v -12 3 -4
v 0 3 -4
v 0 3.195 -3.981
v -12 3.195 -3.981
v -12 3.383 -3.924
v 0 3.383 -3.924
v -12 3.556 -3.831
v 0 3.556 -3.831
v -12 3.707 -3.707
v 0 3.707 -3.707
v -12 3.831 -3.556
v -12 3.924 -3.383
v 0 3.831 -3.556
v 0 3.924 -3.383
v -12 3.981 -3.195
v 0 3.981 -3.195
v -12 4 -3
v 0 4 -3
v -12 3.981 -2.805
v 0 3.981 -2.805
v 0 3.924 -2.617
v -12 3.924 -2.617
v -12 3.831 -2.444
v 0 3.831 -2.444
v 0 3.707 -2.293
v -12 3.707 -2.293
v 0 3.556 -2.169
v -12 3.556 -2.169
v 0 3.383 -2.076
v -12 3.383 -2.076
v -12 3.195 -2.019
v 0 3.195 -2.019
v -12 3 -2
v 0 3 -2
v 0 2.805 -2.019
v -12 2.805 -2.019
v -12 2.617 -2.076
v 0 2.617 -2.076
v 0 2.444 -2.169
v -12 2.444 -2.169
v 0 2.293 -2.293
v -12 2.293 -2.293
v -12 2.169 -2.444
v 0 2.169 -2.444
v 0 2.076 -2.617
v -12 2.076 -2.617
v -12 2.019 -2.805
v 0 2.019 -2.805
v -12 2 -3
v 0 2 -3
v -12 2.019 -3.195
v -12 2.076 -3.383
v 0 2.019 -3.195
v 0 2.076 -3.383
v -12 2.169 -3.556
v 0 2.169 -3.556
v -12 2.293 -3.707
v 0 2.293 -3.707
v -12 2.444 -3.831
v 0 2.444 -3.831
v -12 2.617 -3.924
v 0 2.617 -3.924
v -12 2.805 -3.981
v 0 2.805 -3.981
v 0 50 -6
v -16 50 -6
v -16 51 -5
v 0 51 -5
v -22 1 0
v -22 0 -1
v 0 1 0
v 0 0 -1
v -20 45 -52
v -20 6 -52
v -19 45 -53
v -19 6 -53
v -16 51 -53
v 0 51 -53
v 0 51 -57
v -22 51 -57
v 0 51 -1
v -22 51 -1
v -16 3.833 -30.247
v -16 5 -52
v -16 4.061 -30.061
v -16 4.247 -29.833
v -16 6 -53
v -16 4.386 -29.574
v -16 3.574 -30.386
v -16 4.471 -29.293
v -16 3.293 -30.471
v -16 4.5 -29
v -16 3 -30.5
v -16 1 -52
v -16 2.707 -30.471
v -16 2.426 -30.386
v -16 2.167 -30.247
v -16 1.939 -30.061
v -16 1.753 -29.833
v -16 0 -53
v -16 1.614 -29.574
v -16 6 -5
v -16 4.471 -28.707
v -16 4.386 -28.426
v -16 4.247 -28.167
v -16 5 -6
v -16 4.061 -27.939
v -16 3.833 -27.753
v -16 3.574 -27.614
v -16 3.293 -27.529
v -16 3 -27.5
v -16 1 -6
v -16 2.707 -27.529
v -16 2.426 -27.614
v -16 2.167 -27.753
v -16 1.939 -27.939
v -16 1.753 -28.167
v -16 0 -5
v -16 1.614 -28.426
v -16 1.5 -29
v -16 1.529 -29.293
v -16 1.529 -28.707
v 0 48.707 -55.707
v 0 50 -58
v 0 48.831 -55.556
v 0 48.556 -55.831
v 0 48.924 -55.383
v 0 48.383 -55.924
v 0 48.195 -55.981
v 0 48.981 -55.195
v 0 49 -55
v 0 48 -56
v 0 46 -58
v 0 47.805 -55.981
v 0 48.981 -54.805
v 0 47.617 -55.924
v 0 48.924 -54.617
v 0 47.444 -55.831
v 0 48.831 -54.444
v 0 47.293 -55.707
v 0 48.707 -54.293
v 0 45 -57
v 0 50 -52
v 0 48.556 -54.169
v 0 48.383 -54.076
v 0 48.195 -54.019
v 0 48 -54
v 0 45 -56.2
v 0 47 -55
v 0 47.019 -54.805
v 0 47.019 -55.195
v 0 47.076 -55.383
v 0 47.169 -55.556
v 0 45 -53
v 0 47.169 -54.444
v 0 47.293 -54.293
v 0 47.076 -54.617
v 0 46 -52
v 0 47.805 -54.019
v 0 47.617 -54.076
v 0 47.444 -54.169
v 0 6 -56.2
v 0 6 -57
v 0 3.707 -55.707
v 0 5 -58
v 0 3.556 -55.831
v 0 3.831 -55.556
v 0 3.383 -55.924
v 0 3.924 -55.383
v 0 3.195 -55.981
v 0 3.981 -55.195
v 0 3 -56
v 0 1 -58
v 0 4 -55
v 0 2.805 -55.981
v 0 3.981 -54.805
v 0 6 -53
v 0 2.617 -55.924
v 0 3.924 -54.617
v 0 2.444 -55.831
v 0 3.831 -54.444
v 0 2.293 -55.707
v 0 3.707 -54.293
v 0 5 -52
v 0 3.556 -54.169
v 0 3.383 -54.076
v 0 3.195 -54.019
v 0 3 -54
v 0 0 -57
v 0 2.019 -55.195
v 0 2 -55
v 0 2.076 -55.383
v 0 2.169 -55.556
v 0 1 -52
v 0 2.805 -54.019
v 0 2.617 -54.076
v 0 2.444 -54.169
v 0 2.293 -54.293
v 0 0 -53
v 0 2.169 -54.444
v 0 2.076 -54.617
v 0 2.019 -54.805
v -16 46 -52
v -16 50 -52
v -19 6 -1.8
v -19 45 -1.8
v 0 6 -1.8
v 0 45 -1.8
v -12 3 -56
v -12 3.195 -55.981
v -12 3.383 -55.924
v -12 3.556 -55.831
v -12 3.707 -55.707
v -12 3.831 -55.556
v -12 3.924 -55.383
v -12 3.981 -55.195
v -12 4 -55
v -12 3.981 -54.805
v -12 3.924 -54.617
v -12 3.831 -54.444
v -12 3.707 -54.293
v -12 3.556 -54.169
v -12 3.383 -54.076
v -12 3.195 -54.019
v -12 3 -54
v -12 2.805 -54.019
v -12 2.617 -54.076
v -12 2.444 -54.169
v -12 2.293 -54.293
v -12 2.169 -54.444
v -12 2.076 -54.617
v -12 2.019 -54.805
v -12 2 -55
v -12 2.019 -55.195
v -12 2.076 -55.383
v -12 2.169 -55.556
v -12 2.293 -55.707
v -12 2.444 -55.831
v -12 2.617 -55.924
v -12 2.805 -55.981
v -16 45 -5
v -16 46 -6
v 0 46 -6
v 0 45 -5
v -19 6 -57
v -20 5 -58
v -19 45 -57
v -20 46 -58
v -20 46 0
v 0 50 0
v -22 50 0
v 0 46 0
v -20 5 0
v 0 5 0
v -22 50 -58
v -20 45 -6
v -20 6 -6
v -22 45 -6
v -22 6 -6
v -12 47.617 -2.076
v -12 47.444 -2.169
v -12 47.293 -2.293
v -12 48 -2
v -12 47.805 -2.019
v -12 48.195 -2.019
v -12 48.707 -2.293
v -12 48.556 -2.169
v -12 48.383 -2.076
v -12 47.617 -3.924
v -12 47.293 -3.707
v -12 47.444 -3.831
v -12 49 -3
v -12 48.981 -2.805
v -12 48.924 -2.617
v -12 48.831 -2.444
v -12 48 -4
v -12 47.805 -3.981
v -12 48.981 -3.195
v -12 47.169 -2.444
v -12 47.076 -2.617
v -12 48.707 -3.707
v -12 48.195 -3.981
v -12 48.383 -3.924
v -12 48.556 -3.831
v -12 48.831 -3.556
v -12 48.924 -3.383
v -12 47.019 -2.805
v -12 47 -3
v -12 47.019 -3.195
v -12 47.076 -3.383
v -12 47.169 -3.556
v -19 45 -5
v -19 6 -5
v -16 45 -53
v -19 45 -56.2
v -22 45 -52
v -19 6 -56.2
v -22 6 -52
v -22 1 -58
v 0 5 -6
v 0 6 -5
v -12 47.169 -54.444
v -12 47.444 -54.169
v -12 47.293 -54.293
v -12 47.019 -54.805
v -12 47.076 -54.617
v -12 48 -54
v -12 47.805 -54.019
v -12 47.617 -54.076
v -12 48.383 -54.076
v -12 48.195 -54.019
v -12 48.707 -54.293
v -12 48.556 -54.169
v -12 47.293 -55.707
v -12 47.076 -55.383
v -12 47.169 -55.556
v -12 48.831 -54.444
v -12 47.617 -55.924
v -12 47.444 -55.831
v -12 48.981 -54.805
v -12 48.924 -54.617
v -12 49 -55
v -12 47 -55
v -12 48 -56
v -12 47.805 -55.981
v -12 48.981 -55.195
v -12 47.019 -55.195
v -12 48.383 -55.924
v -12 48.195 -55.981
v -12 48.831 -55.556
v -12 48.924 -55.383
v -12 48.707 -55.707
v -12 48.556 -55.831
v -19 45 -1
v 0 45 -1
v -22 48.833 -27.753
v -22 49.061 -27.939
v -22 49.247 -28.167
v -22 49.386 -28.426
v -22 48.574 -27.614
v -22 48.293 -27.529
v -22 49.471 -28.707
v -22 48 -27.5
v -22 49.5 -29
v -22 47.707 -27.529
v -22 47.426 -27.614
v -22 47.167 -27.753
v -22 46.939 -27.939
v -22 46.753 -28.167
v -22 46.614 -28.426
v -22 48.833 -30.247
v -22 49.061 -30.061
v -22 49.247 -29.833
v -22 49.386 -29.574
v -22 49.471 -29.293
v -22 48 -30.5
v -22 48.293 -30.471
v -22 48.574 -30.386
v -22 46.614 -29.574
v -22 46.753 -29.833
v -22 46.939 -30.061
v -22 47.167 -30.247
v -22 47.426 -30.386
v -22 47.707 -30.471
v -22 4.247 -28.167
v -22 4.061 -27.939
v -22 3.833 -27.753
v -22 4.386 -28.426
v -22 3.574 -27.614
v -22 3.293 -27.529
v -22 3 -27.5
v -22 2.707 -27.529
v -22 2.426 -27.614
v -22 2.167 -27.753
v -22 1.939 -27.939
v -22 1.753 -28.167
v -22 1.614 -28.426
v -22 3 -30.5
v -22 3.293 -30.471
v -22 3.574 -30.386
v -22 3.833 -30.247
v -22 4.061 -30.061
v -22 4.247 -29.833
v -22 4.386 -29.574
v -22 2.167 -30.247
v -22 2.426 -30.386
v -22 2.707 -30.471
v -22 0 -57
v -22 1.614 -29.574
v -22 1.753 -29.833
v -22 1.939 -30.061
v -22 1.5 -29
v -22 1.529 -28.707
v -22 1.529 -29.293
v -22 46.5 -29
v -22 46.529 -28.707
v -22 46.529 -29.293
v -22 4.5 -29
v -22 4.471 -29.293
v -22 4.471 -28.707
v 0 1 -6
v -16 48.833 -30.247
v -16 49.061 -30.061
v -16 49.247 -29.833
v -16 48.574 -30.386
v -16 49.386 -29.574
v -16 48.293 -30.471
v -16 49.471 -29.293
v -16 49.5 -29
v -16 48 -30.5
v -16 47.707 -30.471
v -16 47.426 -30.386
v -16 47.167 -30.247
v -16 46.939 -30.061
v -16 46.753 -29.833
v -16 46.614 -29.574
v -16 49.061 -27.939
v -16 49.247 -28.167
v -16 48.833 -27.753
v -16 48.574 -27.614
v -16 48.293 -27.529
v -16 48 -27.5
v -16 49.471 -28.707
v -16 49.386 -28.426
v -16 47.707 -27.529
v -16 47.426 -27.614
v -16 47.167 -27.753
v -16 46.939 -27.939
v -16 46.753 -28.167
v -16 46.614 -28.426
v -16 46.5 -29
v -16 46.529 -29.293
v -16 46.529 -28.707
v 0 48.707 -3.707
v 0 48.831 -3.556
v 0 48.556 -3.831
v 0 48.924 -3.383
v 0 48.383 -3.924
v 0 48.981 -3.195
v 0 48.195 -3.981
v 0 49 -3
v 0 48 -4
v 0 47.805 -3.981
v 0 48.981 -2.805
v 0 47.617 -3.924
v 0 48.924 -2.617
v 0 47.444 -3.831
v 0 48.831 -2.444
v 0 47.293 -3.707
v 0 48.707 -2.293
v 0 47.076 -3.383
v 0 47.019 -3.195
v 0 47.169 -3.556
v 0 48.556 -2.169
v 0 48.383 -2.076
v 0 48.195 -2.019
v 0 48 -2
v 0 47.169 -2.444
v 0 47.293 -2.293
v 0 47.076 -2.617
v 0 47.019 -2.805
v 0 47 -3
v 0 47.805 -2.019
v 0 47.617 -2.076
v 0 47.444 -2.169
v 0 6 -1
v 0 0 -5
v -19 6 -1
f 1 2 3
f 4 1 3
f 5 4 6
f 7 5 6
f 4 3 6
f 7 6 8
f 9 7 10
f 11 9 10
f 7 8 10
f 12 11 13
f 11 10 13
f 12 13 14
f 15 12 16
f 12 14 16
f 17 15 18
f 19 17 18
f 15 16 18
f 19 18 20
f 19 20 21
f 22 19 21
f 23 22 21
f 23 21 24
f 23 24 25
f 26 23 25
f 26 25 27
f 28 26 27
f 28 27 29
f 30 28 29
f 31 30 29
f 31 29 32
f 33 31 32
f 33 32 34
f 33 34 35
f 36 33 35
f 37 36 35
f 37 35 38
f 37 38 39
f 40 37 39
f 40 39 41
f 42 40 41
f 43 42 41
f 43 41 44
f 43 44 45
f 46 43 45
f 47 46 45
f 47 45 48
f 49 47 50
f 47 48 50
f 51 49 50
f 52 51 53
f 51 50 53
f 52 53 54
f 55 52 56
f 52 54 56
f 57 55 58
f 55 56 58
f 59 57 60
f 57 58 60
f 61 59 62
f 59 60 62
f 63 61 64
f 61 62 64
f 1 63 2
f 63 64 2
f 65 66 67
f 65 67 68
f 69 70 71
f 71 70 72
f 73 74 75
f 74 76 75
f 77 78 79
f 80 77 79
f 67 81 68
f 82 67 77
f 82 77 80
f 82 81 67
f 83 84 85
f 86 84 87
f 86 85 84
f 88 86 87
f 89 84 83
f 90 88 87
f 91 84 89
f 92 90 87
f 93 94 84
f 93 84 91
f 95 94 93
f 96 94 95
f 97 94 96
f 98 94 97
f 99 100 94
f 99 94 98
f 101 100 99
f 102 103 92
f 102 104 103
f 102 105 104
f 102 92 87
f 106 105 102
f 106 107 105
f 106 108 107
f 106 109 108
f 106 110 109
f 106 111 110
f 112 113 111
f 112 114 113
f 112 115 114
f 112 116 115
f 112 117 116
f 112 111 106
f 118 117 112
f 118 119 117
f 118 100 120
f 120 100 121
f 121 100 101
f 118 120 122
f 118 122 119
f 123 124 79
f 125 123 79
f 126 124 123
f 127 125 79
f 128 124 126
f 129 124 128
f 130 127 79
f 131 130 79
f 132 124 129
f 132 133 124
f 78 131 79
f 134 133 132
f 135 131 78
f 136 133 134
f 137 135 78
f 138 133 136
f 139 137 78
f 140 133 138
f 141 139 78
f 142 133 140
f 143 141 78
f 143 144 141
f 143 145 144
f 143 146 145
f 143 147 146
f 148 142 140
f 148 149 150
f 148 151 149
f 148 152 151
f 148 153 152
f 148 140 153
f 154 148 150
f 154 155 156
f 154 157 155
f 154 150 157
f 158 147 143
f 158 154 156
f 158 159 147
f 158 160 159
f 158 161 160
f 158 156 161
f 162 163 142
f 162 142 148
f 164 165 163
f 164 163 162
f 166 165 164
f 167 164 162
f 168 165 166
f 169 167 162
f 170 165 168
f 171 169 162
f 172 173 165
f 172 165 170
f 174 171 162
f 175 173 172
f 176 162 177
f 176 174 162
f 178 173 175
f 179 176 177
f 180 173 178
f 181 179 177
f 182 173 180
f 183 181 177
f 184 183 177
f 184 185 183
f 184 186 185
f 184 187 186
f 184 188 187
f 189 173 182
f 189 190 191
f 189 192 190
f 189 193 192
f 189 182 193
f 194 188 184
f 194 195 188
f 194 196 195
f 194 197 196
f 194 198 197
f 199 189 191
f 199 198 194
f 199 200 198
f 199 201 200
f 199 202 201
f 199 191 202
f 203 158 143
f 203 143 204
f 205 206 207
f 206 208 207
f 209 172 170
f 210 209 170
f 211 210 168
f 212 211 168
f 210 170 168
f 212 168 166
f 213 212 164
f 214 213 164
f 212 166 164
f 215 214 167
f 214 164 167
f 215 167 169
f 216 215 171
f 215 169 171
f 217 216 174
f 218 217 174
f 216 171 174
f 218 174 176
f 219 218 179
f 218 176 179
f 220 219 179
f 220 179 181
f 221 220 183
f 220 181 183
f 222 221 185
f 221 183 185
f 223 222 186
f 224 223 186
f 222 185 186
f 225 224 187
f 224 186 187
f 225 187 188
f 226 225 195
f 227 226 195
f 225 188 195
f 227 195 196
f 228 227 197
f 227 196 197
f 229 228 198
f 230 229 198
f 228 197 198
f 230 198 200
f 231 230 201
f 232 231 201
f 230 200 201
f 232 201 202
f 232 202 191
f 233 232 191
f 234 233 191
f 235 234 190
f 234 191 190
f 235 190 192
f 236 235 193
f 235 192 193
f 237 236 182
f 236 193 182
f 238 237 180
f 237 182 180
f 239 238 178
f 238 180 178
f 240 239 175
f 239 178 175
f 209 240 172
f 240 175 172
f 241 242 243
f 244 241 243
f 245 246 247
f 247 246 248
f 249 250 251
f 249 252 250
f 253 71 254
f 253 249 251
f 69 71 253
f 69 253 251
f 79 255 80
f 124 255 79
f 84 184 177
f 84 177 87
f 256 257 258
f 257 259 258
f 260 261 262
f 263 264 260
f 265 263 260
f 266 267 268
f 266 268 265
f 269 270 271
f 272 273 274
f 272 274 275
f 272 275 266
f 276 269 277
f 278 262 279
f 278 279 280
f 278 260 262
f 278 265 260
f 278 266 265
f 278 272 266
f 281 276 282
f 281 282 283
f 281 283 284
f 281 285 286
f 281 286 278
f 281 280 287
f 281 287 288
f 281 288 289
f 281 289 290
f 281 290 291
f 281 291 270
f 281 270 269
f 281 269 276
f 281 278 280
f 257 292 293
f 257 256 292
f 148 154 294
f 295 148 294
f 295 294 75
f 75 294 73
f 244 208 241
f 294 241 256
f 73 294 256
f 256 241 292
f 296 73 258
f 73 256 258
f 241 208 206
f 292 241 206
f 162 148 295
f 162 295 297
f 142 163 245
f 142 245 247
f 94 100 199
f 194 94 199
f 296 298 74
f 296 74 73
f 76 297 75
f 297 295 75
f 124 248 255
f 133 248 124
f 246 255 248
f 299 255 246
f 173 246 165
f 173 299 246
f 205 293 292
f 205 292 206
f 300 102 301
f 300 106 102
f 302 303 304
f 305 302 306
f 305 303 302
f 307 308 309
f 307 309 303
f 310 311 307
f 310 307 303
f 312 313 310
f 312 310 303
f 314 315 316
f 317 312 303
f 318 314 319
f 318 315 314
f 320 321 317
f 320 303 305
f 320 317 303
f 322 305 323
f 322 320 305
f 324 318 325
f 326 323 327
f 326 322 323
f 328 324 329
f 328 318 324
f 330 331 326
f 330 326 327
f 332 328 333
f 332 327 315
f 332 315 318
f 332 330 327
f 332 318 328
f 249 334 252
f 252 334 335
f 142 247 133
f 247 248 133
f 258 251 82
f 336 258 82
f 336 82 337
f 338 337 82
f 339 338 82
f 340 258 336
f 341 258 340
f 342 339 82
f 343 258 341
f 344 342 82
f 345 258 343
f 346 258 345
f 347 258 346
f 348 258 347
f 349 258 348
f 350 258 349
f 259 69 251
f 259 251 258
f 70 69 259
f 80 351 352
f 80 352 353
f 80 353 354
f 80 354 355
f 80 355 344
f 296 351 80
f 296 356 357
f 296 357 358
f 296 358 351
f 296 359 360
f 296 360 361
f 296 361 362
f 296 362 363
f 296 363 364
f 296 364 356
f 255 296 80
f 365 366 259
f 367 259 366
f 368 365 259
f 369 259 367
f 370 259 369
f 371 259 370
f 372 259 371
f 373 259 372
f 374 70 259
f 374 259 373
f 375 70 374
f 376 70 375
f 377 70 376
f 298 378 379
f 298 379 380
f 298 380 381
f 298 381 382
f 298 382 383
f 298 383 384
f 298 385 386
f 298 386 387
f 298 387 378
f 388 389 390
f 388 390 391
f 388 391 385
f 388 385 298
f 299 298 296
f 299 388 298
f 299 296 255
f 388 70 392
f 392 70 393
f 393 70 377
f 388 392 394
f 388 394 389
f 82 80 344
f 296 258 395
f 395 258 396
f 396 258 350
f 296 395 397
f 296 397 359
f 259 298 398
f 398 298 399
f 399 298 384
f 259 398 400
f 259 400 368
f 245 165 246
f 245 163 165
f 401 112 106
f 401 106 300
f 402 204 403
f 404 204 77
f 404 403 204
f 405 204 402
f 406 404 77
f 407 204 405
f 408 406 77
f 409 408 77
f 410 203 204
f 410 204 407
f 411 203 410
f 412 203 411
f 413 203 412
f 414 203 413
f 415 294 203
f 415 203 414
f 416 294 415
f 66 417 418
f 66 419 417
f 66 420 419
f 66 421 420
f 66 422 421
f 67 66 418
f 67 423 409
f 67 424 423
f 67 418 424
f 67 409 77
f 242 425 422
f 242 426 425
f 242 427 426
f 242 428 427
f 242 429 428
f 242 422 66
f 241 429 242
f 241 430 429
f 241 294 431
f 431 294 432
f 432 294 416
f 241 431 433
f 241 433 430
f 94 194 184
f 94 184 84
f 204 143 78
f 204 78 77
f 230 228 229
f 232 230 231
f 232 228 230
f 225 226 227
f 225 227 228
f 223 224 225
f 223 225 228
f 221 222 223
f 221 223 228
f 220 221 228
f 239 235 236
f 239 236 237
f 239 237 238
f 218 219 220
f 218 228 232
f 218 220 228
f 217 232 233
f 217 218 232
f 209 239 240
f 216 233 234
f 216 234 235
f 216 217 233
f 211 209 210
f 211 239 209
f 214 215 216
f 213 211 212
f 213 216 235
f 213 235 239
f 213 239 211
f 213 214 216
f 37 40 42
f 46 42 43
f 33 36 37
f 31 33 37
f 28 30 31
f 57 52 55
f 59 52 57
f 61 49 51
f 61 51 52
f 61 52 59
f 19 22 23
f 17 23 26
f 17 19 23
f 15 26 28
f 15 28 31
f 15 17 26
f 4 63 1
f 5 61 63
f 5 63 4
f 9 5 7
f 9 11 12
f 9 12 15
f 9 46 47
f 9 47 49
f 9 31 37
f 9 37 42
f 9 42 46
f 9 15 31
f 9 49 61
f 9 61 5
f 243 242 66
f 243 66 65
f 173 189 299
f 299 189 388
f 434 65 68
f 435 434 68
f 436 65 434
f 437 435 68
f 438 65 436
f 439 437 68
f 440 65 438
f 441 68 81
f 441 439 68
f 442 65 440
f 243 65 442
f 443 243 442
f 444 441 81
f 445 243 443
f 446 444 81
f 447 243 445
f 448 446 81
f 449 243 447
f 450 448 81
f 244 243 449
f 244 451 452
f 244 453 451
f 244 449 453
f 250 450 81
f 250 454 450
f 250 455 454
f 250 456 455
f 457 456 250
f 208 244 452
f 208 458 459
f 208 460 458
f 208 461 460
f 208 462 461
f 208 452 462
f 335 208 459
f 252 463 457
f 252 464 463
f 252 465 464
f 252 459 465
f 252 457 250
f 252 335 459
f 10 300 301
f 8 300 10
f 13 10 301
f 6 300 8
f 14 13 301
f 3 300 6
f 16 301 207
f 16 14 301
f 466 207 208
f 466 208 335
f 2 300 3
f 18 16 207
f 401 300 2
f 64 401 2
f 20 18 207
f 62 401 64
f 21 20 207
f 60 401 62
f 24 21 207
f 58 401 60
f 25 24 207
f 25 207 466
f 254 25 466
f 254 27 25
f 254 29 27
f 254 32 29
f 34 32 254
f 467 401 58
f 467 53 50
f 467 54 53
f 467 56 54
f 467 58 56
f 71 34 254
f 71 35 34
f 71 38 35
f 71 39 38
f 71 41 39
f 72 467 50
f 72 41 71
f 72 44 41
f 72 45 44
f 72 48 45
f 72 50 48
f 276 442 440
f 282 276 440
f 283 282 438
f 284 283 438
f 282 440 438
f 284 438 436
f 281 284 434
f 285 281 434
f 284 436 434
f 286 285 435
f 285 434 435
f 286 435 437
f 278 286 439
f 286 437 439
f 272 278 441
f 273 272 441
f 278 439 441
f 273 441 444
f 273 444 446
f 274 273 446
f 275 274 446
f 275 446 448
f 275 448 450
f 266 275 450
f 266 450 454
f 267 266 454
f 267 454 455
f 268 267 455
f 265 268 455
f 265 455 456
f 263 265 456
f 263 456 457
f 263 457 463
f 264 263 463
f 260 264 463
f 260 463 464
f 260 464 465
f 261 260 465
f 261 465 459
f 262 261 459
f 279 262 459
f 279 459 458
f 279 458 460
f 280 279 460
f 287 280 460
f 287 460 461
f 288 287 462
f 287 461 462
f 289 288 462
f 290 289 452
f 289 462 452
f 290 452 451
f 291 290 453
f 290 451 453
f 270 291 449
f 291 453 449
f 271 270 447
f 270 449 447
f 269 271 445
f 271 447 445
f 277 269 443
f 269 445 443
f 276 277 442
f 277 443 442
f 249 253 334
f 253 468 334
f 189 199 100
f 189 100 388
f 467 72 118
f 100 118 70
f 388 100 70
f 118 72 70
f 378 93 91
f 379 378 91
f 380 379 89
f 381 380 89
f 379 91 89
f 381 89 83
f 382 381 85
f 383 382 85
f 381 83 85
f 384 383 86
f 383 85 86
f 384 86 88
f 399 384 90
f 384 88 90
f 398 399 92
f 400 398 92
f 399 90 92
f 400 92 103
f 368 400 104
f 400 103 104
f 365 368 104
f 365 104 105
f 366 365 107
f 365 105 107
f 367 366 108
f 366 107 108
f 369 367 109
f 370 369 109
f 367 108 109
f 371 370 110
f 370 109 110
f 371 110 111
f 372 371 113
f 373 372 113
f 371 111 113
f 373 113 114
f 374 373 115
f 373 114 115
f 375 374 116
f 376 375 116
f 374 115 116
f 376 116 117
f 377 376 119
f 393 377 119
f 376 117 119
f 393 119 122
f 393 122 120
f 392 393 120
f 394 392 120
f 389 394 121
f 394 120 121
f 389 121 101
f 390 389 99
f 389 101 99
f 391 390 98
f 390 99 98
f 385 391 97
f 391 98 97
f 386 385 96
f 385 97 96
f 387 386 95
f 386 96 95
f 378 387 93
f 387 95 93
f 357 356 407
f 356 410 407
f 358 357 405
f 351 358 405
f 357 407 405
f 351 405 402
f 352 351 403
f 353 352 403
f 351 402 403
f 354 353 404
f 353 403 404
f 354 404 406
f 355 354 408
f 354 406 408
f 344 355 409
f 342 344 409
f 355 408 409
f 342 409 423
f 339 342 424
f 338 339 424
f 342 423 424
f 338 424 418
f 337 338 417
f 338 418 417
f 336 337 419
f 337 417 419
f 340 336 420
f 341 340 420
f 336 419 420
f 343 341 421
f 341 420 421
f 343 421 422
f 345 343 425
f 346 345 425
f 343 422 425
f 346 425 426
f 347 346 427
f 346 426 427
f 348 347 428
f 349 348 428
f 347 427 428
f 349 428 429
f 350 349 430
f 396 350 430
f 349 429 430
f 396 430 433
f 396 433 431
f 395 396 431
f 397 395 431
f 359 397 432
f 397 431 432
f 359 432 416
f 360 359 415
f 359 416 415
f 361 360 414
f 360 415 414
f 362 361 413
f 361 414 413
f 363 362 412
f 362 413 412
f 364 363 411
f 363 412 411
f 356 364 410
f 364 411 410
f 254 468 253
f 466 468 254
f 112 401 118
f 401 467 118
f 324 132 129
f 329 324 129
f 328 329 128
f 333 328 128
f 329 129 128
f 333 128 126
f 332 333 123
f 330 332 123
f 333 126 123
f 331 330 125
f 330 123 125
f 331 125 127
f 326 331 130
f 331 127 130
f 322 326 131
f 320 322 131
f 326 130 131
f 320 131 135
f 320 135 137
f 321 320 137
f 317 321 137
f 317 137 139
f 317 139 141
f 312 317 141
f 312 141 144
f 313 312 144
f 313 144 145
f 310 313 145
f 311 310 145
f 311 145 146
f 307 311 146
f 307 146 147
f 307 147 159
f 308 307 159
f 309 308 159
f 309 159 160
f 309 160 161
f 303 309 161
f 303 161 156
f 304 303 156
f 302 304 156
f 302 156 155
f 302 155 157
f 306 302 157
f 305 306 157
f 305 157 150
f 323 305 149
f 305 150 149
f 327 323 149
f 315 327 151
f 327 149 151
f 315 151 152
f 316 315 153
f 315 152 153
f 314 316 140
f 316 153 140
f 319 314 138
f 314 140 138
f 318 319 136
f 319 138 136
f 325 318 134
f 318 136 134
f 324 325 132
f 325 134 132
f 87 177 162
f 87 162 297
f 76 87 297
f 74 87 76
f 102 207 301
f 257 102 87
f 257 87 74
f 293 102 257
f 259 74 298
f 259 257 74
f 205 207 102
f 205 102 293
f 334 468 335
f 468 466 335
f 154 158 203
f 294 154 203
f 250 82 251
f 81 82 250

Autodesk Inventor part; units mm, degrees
ref_plane "YZ Plane" through (0, 0, 0) normal (1, 0, 0) x (0, 1, 0)
ref_plane "XZ Plane" through (0, 0, 0) normal (0, 1, 0) x (-1, 0, 0)
ref_plane "XY Plane" through (0, 0, 0) normal (0, 0, 1) x (1, 0, 0)
sketch "Sketch1" plane through (0, 0, 0) normal (0, 1, 0) x (-1, 0, 0)
  line L0 (0, 0) -> (22, 0)
  line L1 (22, 0) -> (22, -58)
  line L2 (22, -58) -> (0, -58)
  line L3 (0, -58) -> (0, -52)
  line L4 (0, -52) -> (16, -52)
  line L5 (16, -52) -> (16, -6)
  line L6 (16, -6) -> (0, -6)
  line L7 (0, -6) -> (0, 0)
  dimension "d0" = 6
  dimension "d1" = 6
  dimension "d2" = 58
  dimension "d3" = 22
extrude "Extrusion1" add sketch "Sketch1" along normal blind 6
sketch "Sketch2" plane through (0, 0, 0) normal (1, 0, 0) x (0, 0, -1)
  line L0 (6, 6) -> (52, 6) projected
  line L1 (0, 0) -> (6, 6) construction
  line L2 (58, 0) -> (58, 6) projected
  line L3 (52, 6) -> (58, 0) construction
  circle A0 centre (3, 3) radius 1
  circle A1 centre (55, 3) radius 1
  dimension "d6" = 2
extrude "Extrusion2" cut sketch "Sketch2" against normal blind 12
sketch "Sketch3" plane through (-16, 0, -6) normal (1, 0, 0) x (0, 0, -1)
  line L0 (0, 6) -> (46, 6) projected
  line L1 (23, 6) -> (23, 0) construction
  circle A0 centre (23, 3) radius 1.5
  line L2 (0, 0) -> (46, 0) projected
  point P0 (-6, 0)
  dimension "d9" = 3
extrude "Extrusion3" cut sketch "Sketch3" against normal through all
pattern_linear "Rectangular Pattern2" count 2 spacing 45 along (0, 1, 0) of "Extrusion1", "Extrusion3", "Extrusion2"
sketch "Sketch5" plane through (-22, 0, -58) normal (-1, 0, 0) x (0, 0, 1)
  line L0 (58, 0) -> (52, 0) projected
  line L1 (52, 51) -> (6, 51) projected
  line L2 (58, 0) -> (52, 0)
  line L3 (52, 0) -> (52, 51)
  line L4 (52, 51) -> (58, 51)
  line L5 (58, 51) -> (58, 0)
  line L6 (6, 0) -> (0, 0) projected
  line L7 (6, 45) -> (6, 51) projected
  line L8 (0, 0) -> (6, 0)
  line L9 (6, 0) -> (6, 51)
  line L10 (6, 51) -> (0, 51)
  line L11 (0, 51) -> (0, 0)
extrude "Extrusion4" add sketch "Sketch5" against normal blind 3
chamfer "Chamfer3" distance 1 angle 45 20 edges at (-11, 51, 0) (-9.5, 45, 0) (-8, 51, -6) (-8, 45, -52) (-8, 51, -52) (-11, 51, -58) (-9.5, 6, -58) (-8, 6, -52) (-8, 0, -52) (-8, 6, -6) (-9.5, 6, 0) (-11, 0, 0) (-8, 45, -6) (-8, 0, -6) (-11, 0, -58) (-9.5, 45, -58) (-19, 25.5, -6) (-19, 25.5, 0) (-19, 25.5, -52) (-19, 25.5, -58)
sketch "Sketch6" plane through (0, 45, -1) normal (1, 0, 0) x (0, 0, -1)
  point P0 (-1, -45)
sketch "Sketch7" plane through (0, 45, -53) normal (1, 0, 0) x (0, 0, -1)
  line L0 (-52, 0) -> (-48, 0) projected
  line L1 (-52, -39) -> (-48, -39) projected
  line L2 (-52, 0) -> (-51.2, 0)
  line L3 (-51.2, 0) -> (-51.2, -39)
  line L4 (-51.2, -39) -> (-52, -39)
  line L5 (-52, -39) -> (-52, 0)
  line L6 (0, 0) -> (4, 0) projected
  line L7 (4, 0) -> (3.2, 0)
  line L8 (3.2, 0) -> (3.2, -39)
  line L9 (3.2, -39) -> (4, -39)
  line L10 (4, -39) -> (4, 0)
  line L11 (0, -39) -> (4, -39) projected
  point P0 (-53, -45)
  point P1 (3.2, 0)
  dimension "d29" = 0.8
  dimension "d30" = 0.8
extrude "Extrusion5" add sketch "Sketch7" against normal up to surface (19 mm away)
equation "\"d30\" = d29"
properties part number "batt-standoff"
